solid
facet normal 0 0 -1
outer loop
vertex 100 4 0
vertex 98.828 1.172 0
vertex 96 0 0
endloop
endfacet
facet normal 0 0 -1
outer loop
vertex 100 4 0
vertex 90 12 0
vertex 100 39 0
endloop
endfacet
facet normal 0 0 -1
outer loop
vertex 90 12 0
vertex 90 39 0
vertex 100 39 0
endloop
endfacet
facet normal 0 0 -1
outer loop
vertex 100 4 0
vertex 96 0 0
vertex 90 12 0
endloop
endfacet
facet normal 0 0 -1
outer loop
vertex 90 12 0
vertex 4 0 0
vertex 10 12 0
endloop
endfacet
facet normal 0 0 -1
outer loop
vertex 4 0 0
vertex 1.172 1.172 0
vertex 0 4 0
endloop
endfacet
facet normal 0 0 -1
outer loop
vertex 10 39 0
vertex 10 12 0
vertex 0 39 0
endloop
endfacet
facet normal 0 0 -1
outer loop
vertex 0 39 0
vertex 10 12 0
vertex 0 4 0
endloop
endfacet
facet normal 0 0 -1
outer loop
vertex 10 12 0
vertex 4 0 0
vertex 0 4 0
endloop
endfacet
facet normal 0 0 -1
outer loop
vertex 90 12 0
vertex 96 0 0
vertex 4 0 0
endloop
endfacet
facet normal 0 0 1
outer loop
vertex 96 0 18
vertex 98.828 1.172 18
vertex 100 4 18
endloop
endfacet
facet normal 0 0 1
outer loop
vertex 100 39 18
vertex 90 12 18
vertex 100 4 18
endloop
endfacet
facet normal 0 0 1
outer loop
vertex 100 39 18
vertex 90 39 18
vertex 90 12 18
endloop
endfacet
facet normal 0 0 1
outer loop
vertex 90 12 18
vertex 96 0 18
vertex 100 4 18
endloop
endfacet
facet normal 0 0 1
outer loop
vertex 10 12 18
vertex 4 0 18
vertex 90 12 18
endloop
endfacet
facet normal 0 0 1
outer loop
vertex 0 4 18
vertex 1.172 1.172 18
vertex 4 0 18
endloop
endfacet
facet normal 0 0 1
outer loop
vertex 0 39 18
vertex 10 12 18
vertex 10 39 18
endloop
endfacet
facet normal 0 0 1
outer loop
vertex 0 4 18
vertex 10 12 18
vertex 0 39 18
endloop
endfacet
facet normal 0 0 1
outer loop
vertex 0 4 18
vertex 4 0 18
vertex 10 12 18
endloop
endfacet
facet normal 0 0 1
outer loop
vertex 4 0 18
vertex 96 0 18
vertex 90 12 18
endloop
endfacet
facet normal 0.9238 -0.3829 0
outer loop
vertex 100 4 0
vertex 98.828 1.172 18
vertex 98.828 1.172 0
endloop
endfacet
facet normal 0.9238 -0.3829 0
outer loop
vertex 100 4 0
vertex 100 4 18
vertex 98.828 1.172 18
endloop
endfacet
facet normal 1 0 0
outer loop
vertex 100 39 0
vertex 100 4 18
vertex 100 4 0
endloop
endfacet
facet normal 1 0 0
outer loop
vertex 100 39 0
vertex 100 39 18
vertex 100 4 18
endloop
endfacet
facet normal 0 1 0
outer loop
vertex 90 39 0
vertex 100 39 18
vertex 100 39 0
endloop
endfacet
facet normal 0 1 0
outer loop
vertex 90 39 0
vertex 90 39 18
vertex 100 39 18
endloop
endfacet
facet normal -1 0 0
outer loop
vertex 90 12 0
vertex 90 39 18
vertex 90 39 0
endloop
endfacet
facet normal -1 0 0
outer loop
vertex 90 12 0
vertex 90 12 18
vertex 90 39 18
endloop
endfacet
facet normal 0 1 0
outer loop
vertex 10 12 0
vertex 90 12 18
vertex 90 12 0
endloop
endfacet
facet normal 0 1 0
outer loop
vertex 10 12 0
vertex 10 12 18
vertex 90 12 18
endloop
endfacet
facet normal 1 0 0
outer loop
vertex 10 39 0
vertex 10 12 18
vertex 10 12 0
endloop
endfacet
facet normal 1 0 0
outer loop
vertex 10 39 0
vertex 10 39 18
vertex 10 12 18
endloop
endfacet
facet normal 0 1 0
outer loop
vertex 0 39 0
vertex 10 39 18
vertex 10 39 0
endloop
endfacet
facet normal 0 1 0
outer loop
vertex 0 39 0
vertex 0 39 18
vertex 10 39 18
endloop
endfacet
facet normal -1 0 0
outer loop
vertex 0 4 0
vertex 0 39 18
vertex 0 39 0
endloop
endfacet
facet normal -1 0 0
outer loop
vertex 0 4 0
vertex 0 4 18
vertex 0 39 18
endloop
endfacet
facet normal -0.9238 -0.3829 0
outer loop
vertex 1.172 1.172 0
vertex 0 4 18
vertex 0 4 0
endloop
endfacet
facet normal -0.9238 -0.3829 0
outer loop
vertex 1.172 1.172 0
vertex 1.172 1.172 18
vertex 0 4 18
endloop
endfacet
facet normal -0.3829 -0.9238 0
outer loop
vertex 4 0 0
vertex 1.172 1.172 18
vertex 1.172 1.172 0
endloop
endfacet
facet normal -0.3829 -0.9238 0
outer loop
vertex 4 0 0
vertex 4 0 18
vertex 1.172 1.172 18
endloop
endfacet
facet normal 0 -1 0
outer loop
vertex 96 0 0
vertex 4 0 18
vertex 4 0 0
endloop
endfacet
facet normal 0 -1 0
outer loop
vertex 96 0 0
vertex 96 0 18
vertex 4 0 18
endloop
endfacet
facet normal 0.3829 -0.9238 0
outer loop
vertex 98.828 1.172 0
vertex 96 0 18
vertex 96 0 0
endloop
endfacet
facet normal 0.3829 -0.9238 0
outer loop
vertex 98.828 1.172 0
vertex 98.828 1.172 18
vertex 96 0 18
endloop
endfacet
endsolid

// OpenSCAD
$fn = 32;

// ----------------------------------------------------------------------
// Heat sink frame: 100 x 39 mm frame, 10 mm walls
// ----------------------------------------------------------------------

// --- parameters (mm) ---
profile_height = 18;      // extrusion height
profile_points = 12;      // points of the closed outline

profile = [[0, 4], [1.172, 1.172], [4, 0], [96, 0], [98.828, 1.172], [100, 4], [100, 39], [90, 39], [90, 12], [10, 12], [10, 39], [0, 39]];  // single closed polygon, 12 points, counter clockwise

// --- the one profile operation ---
linear_extrude(height = profile_height) polygon(points = profile);
